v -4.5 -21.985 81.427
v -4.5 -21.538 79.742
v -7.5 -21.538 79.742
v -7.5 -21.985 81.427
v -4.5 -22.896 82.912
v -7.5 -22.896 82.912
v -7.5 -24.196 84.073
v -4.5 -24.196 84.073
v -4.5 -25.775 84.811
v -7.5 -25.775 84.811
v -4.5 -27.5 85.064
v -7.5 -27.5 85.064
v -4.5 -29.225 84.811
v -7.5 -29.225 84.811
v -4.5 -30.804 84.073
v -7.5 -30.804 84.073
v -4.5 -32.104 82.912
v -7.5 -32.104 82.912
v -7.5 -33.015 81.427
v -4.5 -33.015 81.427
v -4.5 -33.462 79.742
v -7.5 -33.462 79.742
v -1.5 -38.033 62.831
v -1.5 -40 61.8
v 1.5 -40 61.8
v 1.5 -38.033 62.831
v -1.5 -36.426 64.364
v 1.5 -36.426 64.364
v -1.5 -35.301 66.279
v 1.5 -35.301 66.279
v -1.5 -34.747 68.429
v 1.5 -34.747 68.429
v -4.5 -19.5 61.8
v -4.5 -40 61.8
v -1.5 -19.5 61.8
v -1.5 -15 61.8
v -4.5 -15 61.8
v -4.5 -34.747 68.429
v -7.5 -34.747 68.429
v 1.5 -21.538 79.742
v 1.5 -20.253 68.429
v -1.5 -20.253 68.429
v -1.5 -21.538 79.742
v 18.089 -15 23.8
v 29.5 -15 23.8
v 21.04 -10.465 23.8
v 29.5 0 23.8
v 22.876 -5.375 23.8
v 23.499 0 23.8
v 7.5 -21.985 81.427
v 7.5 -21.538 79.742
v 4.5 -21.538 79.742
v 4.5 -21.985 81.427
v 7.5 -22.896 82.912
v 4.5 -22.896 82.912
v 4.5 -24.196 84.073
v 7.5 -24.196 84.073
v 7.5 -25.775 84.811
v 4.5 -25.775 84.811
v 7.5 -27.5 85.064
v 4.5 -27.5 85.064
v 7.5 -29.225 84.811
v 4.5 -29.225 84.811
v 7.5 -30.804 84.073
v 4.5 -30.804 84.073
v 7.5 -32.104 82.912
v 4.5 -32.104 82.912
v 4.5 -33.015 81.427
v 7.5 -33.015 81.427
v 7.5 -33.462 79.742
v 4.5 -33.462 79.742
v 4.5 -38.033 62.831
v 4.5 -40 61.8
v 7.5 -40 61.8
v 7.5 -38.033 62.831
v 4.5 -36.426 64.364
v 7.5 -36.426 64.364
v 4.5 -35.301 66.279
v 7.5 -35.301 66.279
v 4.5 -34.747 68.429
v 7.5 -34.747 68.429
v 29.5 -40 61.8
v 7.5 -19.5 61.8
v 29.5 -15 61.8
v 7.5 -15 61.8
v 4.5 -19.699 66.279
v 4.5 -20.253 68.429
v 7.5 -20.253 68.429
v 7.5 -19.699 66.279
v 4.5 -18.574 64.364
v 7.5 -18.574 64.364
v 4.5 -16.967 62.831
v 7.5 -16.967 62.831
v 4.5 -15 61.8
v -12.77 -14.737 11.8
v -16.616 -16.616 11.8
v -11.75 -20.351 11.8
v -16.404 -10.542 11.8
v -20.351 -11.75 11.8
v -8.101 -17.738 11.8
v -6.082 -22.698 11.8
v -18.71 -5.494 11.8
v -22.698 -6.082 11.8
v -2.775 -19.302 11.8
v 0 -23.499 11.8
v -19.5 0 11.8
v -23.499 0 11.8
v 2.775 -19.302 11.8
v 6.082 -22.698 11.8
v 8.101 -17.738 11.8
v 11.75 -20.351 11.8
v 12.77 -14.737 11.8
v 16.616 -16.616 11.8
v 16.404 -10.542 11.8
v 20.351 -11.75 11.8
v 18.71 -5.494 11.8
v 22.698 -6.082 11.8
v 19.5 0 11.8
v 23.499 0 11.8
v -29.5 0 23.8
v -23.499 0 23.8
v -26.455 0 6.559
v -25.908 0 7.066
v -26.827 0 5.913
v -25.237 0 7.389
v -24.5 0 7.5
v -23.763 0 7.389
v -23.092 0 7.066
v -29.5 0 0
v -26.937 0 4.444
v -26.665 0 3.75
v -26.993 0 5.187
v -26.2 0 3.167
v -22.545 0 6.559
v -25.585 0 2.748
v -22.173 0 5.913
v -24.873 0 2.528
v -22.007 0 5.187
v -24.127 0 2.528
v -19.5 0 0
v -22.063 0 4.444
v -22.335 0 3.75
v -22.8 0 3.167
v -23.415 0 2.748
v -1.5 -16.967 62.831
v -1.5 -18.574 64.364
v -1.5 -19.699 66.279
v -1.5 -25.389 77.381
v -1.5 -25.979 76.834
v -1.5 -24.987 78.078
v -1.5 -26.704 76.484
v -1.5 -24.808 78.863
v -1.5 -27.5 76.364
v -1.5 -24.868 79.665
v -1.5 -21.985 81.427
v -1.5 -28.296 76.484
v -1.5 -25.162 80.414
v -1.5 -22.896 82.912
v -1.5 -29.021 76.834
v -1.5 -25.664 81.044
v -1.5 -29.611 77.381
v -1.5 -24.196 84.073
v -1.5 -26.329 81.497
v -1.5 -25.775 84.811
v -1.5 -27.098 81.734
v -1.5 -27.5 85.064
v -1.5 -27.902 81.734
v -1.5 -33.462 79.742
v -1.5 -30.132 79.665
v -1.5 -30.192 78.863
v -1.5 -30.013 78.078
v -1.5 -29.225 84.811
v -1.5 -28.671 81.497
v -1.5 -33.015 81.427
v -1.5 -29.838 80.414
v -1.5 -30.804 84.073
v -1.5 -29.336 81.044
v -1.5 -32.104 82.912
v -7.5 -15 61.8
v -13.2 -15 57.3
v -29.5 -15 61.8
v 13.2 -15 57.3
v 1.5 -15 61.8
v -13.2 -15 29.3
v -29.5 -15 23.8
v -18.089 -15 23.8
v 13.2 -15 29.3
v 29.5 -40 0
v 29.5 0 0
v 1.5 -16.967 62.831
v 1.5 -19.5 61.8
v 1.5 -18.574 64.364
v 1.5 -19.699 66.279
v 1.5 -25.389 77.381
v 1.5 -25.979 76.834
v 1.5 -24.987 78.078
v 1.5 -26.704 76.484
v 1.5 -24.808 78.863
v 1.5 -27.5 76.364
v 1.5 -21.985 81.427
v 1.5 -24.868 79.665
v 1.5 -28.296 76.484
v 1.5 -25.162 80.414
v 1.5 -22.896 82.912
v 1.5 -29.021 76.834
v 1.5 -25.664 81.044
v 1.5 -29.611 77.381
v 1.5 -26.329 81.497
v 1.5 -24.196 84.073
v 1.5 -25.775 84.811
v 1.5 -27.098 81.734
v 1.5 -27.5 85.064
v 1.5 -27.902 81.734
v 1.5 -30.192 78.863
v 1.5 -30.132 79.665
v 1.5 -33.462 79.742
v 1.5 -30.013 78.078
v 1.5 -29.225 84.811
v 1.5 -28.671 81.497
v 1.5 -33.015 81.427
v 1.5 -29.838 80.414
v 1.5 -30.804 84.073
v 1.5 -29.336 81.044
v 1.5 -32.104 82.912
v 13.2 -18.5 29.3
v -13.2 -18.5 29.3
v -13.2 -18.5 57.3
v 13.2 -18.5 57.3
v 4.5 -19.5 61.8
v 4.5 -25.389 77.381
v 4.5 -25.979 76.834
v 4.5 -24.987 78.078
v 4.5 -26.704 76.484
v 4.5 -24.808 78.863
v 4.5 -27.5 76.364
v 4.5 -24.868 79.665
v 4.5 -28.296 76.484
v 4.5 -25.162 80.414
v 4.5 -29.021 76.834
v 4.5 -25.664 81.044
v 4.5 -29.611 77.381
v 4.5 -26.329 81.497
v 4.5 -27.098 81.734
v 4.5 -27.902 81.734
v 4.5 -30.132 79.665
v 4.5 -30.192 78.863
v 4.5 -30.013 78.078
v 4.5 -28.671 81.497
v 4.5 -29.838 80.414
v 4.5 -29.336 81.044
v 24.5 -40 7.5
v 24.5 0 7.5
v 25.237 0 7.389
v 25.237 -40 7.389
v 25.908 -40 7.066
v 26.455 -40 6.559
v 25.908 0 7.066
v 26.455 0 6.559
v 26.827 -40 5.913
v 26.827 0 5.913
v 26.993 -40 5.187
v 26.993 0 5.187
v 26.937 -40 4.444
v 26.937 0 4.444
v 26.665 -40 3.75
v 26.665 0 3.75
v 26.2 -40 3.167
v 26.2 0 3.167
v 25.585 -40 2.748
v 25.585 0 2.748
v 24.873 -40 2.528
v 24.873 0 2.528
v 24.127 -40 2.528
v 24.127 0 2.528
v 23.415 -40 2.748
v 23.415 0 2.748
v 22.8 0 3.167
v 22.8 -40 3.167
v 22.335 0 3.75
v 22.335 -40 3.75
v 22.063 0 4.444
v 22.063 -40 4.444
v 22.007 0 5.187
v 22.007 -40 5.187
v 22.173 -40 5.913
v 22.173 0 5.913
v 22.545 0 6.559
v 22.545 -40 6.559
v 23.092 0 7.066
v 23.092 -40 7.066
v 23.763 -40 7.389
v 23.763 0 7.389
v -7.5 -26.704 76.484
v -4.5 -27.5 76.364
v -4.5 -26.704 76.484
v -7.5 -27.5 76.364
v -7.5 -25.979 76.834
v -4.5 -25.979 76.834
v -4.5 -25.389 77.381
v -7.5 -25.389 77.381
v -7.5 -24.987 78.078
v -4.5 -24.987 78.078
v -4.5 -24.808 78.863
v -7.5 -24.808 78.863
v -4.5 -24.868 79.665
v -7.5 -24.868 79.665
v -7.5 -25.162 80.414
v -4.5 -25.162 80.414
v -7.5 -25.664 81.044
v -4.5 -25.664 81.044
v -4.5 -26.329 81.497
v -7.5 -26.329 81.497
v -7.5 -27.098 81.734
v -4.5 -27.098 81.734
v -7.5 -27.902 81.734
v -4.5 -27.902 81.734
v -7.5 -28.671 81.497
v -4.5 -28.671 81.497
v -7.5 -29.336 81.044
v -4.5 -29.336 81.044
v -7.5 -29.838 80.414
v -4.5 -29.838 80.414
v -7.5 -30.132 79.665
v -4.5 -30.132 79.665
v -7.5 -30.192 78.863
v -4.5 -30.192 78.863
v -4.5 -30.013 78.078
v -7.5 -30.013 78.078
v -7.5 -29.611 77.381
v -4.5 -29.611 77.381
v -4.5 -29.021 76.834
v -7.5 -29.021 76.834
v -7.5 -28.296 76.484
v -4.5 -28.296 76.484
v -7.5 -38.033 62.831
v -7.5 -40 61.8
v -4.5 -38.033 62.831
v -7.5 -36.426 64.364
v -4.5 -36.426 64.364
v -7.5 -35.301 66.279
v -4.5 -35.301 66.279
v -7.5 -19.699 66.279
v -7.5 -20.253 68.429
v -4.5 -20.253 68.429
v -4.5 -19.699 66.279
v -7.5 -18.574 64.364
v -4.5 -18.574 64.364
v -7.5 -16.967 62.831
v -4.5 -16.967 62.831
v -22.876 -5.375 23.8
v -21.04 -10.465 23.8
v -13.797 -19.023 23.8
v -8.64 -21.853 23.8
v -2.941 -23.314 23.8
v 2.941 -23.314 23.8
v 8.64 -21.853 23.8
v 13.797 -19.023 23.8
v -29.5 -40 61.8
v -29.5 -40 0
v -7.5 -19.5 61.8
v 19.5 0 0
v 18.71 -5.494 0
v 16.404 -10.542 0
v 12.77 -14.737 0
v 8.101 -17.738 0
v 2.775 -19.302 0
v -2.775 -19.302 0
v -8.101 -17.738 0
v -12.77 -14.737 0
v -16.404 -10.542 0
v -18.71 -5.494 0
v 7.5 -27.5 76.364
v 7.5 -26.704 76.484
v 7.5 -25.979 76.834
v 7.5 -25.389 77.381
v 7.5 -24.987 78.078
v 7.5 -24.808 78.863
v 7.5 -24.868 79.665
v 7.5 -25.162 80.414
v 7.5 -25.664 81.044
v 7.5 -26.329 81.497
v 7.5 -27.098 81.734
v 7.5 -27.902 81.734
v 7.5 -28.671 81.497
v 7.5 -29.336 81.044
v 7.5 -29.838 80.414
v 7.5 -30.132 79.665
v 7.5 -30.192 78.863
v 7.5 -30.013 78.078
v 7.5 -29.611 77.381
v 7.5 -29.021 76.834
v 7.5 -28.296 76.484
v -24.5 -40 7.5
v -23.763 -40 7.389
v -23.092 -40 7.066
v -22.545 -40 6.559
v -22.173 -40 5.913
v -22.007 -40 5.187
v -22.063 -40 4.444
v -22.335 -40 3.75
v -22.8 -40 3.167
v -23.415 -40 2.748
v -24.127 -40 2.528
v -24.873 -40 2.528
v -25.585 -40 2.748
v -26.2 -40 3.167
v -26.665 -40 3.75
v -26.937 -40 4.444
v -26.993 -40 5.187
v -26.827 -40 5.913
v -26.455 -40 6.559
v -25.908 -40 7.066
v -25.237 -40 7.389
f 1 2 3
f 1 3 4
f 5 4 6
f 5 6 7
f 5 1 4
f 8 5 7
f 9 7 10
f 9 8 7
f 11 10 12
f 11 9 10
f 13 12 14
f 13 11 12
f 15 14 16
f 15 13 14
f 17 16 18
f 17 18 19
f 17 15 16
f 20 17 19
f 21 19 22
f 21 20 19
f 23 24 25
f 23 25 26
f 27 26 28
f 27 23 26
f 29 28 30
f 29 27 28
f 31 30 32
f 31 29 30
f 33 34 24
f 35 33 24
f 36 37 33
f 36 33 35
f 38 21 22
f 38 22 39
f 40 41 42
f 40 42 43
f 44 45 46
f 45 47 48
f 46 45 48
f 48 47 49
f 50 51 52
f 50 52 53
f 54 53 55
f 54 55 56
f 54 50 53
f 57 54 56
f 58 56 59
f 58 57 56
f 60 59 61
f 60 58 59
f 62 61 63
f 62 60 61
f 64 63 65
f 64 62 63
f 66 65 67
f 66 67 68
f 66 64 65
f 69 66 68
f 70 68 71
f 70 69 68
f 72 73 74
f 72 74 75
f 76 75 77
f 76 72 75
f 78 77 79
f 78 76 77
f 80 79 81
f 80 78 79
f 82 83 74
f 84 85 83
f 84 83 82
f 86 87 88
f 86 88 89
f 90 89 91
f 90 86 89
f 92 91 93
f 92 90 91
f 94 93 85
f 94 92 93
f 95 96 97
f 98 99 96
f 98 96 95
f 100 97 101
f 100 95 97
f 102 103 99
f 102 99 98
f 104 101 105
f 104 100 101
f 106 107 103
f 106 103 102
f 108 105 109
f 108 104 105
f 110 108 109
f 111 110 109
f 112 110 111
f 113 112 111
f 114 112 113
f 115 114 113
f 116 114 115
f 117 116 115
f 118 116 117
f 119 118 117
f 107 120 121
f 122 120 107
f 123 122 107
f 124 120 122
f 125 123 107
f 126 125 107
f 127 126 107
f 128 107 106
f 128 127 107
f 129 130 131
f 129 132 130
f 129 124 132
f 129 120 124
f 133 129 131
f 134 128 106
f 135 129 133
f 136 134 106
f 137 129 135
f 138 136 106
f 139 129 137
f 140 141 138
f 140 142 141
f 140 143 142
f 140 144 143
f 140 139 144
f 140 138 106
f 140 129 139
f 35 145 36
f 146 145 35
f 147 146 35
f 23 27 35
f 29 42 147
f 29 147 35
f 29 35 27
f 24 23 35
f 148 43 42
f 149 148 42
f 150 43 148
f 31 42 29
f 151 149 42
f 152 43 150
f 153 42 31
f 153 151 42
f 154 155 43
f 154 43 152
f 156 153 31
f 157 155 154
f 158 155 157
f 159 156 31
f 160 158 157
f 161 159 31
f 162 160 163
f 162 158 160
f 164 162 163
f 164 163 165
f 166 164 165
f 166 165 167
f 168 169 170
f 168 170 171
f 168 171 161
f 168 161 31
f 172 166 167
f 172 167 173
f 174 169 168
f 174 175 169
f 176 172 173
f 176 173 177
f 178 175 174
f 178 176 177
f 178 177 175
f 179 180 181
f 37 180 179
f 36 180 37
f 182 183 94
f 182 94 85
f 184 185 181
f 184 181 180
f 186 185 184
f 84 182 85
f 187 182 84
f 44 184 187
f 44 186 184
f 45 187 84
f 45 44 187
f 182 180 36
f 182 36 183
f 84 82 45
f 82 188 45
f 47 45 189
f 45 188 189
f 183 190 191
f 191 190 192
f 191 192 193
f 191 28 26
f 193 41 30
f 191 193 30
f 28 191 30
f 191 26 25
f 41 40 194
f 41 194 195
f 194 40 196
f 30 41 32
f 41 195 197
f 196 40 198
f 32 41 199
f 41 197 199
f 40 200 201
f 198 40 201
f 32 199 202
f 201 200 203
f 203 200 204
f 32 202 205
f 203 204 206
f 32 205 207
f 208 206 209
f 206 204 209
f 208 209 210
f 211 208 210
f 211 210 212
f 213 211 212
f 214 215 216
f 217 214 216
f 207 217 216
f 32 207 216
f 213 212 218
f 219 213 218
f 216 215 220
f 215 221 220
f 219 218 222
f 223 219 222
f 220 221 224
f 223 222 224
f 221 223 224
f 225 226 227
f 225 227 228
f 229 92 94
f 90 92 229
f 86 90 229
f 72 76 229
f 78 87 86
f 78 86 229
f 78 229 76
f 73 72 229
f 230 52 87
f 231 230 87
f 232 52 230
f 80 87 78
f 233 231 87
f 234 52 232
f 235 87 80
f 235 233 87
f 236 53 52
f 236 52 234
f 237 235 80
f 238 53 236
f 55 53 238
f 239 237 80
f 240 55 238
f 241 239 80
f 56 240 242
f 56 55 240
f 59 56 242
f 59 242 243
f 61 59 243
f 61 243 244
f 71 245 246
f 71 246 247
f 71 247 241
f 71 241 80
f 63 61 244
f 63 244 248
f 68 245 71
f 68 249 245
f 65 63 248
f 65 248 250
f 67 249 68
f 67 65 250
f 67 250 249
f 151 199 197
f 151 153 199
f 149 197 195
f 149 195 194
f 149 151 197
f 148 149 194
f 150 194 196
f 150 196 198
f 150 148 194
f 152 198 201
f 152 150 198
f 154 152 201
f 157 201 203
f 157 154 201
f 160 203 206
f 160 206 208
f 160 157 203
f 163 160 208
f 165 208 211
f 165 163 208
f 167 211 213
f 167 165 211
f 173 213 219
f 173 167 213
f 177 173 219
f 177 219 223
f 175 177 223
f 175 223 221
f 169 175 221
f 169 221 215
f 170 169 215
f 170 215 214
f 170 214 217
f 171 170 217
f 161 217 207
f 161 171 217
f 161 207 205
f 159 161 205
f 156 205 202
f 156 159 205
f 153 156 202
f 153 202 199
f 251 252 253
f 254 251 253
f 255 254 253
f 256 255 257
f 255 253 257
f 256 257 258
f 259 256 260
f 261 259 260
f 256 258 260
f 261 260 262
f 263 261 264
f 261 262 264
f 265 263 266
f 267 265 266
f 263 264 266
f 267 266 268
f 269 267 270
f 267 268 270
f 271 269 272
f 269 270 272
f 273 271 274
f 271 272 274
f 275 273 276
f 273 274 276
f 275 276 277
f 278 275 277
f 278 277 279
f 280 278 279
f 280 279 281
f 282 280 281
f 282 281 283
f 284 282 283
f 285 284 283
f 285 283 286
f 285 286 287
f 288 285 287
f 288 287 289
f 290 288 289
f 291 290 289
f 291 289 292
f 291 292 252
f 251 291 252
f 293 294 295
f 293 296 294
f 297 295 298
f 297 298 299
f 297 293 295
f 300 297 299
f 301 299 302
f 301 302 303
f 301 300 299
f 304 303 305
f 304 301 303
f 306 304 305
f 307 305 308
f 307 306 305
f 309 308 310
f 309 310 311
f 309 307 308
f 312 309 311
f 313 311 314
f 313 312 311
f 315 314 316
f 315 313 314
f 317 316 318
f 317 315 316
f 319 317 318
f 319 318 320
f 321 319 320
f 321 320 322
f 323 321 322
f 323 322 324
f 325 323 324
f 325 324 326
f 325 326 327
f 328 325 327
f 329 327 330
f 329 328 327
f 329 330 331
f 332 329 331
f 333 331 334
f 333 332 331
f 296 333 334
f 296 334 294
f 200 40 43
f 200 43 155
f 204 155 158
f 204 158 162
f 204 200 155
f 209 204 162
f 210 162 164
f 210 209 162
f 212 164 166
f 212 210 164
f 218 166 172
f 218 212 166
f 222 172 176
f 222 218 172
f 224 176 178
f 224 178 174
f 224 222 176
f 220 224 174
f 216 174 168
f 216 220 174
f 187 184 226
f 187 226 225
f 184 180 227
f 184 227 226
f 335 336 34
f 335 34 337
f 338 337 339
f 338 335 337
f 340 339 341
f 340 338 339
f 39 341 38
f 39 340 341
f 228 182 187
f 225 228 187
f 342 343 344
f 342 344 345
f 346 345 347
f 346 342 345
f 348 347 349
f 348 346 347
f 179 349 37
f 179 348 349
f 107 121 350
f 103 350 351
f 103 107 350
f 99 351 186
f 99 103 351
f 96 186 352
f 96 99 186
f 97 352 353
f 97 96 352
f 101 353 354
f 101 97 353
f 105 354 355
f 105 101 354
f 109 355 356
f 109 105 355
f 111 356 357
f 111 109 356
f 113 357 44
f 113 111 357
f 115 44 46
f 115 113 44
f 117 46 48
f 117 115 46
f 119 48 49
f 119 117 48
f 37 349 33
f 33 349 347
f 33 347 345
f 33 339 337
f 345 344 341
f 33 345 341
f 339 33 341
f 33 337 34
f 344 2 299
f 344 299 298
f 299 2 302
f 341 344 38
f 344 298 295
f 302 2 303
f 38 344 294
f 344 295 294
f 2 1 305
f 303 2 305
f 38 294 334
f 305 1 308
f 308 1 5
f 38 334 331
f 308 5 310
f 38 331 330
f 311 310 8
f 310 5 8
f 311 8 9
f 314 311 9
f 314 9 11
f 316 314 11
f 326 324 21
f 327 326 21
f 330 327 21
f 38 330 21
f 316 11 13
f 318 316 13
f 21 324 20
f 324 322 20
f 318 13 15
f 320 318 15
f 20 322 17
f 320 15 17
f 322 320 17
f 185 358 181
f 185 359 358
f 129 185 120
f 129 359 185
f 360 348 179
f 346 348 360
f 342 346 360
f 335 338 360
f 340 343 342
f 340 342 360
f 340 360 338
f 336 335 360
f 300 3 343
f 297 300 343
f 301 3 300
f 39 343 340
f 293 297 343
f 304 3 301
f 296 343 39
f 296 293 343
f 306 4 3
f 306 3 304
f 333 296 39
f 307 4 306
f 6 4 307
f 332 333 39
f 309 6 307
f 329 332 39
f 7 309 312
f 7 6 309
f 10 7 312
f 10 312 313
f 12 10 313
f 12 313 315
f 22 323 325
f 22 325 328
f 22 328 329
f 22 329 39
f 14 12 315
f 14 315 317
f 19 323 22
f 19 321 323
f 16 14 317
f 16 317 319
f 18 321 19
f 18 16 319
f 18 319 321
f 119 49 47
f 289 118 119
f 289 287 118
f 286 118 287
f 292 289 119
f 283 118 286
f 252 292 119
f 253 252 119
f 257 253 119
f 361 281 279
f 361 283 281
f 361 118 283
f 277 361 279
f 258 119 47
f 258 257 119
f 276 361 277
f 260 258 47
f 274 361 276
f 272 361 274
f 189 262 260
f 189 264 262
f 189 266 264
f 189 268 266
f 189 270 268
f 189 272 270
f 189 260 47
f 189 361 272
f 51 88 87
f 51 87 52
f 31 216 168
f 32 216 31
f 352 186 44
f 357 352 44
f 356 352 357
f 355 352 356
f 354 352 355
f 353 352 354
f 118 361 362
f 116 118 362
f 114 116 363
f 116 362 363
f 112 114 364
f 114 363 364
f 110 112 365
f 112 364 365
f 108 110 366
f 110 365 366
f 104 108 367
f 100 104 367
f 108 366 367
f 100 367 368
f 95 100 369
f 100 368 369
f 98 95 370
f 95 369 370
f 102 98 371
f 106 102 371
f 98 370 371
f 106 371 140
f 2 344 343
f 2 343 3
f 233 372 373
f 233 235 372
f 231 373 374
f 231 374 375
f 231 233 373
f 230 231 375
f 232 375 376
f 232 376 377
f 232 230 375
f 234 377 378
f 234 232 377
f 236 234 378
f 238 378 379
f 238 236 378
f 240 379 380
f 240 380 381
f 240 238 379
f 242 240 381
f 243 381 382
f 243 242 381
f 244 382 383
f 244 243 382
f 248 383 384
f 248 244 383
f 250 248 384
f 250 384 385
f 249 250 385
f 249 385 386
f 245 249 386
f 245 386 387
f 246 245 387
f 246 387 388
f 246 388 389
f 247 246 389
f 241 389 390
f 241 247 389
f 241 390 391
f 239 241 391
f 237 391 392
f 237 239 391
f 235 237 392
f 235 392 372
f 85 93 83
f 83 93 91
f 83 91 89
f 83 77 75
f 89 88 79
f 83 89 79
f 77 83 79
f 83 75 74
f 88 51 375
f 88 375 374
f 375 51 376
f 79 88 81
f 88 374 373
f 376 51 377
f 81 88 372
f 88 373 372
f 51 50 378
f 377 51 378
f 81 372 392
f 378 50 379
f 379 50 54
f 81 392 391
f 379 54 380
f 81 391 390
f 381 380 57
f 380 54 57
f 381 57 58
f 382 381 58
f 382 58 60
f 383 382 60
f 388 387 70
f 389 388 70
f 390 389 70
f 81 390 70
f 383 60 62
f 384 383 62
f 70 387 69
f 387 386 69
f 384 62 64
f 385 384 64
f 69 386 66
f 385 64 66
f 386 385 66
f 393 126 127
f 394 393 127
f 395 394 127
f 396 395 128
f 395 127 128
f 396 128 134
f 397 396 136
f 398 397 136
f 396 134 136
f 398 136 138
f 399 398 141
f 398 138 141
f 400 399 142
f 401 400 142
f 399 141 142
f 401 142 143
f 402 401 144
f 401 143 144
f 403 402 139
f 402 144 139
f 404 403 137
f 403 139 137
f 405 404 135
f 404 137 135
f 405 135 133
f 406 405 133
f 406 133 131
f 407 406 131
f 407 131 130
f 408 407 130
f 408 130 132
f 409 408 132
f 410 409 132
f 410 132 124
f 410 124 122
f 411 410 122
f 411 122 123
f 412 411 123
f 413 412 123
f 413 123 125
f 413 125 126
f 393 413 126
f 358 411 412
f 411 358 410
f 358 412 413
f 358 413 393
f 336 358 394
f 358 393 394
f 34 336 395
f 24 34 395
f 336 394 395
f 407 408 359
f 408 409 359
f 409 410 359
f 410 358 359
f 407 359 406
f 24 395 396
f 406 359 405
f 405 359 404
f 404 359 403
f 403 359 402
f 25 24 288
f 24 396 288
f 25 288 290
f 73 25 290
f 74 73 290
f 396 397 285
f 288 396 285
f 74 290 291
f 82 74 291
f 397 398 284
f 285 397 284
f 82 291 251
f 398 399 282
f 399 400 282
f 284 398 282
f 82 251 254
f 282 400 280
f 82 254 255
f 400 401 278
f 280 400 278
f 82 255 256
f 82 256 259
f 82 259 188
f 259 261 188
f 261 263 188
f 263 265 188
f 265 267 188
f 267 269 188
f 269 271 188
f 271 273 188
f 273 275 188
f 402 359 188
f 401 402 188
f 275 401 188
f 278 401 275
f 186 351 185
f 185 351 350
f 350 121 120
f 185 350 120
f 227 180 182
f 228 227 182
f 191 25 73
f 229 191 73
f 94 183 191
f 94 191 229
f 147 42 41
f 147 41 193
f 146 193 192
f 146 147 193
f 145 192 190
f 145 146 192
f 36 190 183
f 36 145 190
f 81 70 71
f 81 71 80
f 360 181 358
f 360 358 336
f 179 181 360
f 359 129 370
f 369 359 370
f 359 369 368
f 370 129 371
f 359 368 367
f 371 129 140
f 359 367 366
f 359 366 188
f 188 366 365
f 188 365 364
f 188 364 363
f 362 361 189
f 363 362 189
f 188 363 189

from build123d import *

# Parameters (mm, degrees)
BOSS_EXTRUDE1_DEPTH = 11.8
BOSS_EXTRUDE2_DEPTH = 12
SKETCH3_W           = 59
SKETCH3_H           = 25
BOSS_EXTRUDE3_DEPTH = 38
SKETCH4_W           = 26.4
SKETCH4_H           = 28
CUT_EXTRUDE1_DEPTH  = 3.5
SKETCH5_R           = 2.5
CUT_EXTRUDE2_DEPTH  = 80.30630492
SKETCH6_R           = 2.7
BOSS_EXTRUDE4_DEPTH = 1.5
LPATTERN1_COUNT     = 2
LPATTERN1_PITCH     = 6
LPATTERN1_COL_COUNT = 2
LPATTERN1_COL_PITCH = 6
FILLET1_R           = 8


with BuildPart() as part:
    # Sketch1 → Boss-Extrude1 (new body)
    with BuildSketch(Plane.XY):
        with BuildLine():
            Line((-19.5, 0), (-29.5, 0))
            Line((-29.5, 0), (-29.5, -40))
            Line((-29.5, -40), (29.5, -40))
            Line((29.5, -40), (29.5, 0))
            Line((29.5, 0), (19.5, 0))
            ThreePointArc((19.5, 0), (0, -19.5), (-19.5, 0))
        make_face()
    extrude(amount=BOSS_EXTRUDE1_DEPTH)

    # Sketch2 → Boss-Extrude2 (add)
    with BuildSketch(Plane.XY.offset(11.8)):
        with BuildLine():
            Line((23.499107394, 0), (29.5, 0))
            Line((29.5, 0), (29.5, -40))
            Line((29.5, -40), (-29.5, -40))
            Line((-29.5, -40), (-29.5, 0))
            Line((-29.5, 0), (-23.499107394, 0))
            ThreePointArc((-23.499107394, 0), (0, -23.499107394), (23.499107394, 0))
        make_face()
    extrude(amount=BOSS_EXTRUDE2_DEPTH)

    # Sketch3 → Boss-Extrude3 (add)
    with BuildSketch(Plane.XY.offset(23.8)):
        with Locations((0, -27.5)):
            Rectangle(SKETCH3_W, SKETCH3_H)
    extrude(amount=BOSS_EXTRUDE3_DEPTH)

    # Sketch4 → Cut-Extrude1 (cut)
    with BuildSketch(Plane(origin=(0, -15, 0), x_dir=(1, 0, 0), z_dir=(0, 1, 0))):
        with Locations((0, -43.3)):
            Rectangle(SKETCH4_W, SKETCH4_H)
    extrude(amount=-CUT_EXTRUDE1_DEPTH, mode=Mode.SUBTRACT)

    # Sketch5 → Cut-Extrude2 (cut, through all)
    with BuildSketch(Plane(origin=(0, 0, 0), x_dir=(1, 0, 0), z_dir=(0, 1, 0))):
        with Locations(Location((-24.5, -5, 0), (0, 0, 270))):
            Circle(SKETCH5_R)
        with Locations(Location((24.5, -5, 0), (0, 0, 270))):
            Circle(SKETCH5_R)
    extrude(amount=-CUT_EXTRUDE2_DEPTH, mode=Mode.SUBTRACT)

    # Sketch6 → Boss-Extrude4 (add, symmetric)
    with BuildSketch(Plane(origin=(0, 0, 0), x_dir=(0, 0, -1), z_dir=(1, 0, 0))):
        with BuildLine():
            Line((-61.8, -19.5), (-79.74176436, -21.538350337))
            ThreePointArc((-79.74176436, -21.538350337), (-85.064465832, -27.5), (-79.74176436, -33.461649663))
            Line((-79.74176436, -33.461649663), (-61.8, -35.5))
            Line((-61.8, -35.5), (-61.8, -19.5))
        make_face()
        with Locations((-79.064465832, -27.5)):
            Circle(SKETCH6_R, mode=Mode.SUBTRACT)
    boss_extrude4 = extrude(amount=BOSS_EXTRUDE4_DEPTH, both=True)

    # LPattern1: Boss-Extrude4 ×2
    with Locations(*[(-i * LPATTERN1_PITCH, 0, 0) for i in range(1, LPATTERN1_COUNT)]):
        add(boss_extrude4)

    # LPattern1 col: Boss-Extrude4 ×2
    with Locations(*[(i * LPATTERN1_COL_PITCH, 0, 0) for i in range(1, LPATTERN1_COL_COUNT)]):
        add(boss_extrude4)

    # Fillet1
    # the kernel refuses this fillet: 8 mm, written as the material it adds along each edge
    with BuildSketch(Plane(origin=(-7.5, -35.5, 61.8), x_dir=(0, -1, 0), z_dir=(1, 0, 0)), Plane(origin=(-1.5, -35.5, 61.8), x_dir=(0, -1, 0), z_dir=(1, 0, 0)), Plane(origin=(4.5, -35.5, 61.8), x_dir=(0, -1, 0), z_dir=(1, 0, 0))) as fillet1_piece_1:
        with BuildLine():
            CenterArc((7.195743205, -7.532129086), FILLET1_R, 109.69224948, 63.826210699)
            Line((-0.753123012, -6.629064382), (-0.912100336, -6.611003087))
            Line((-0.912100336, -6.611003087), (-0.158977324, 0.018061294))
            Line((-0.158977324, 0.018061294), (0, 0.16))
            ThreePointArc((0, 0.16), (2.25, 0.16), (4.446085136, 0.150642582))
            Line((4.446085136, 0.150642582), (4.5, 0))
        make_face()
    extrude(amount=3)
    with BuildSketch(Plane(origin=(-7.5, -35.5, 61.8), x_dir=(0, -1, 0), z_dir=(1, 0, 0))) as fillet1_piece_2_section:
        with BuildLine():
            CenterArc((7.195743205, -7.532129086), FILLET1_R, 109.69224948, 63.826210699)
            Line((-0.753123012, -6.629064382), (-0.912100336, -6.611003087))
            Line((-0.912100336, -6.611003087), (-0.158977324, 0.018061294))
            Line((-0.158977324, 0.018061294), (0, 0.16))
            ThreePointArc((0, 0.16), (2.25, 0.16), (4.446085136, 0.150642582))
            Line((4.446085136, 0.150642582), (4.5, 0))
        make_face()
    fillet1_piece_2 = extrude(amount=19.679270227, mode=Mode.PRIVATE)
    fillet1_piece_2 = split(fillet1_piece_2, bisect_by=Plane(origin=(-1.5, -36.458947271, 63.391764359), z_dir=(1, 0, 0)), keep=Keep.TOP, mode=Mode.PRIVATE)
    fillet1_piece_2 = split(fillet1_piece_2, bisect_by=Plane(origin=(1.5, -36.458947271, 63.391764359), z_dir=(-1, 0, 0)), keep=Keep.TOP, mode=Mode.PRIVATE)
    add(fillet1_piece_2)
    with BuildSketch(Plane(origin=(-7.5, -35.5, 61.8), x_dir=(0, -1, 0), z_dir=(1, 0, 0))) as fillet1_piece_3_section:
        with BuildLine():
            CenterArc((7.195743205, -7.532129086), FILLET1_R, 109.69224948, 63.826210699)
            Line((-0.753123012, -6.629064382), (-0.912100336, -6.611003087))
            Line((-0.912100336, -6.611003087), (-0.158977324, 0.018061294))
            Line((-0.158977324, 0.018061294), (0, 0.16))
            ThreePointArc((0, 0.16), (2.25, 0.16), (4.446085136, 0.150642582))
            Line((4.446085136, 0.150642582), (4.5, 0))
        make_face()
    fillet1_piece_3 = extrude(amount=19.679270227, mode=Mode.PRIVATE)
    fillet1_piece_3 = split(fillet1_piece_3, bisect_by=Plane(origin=(4.5, -36.458947271, 63.391764359), z_dir=(1, 0, 0)), keep=Keep.TOP, mode=Mode.PRIVATE)
    fillet1_piece_3 = split(fillet1_piece_3, bisect_by=Plane(origin=(7.5, -36.458947271, 63.391764359), z_dir=(-1, 0, 0)), keep=Keep.TOP, mode=Mode.PRIVATE)
    add(fillet1_piece_3)
    with BuildSketch(Plane(origin=(-7.5, -19.5, 61.8), x_dir=(0, 1, 0), z_dir=(1, 0, 0)), Plane(origin=(-1.5, -19.5, 61.8), x_dir=(0, 1, 0), z_dir=(1, 0, 0)), Plane(origin=(4.5, -19.5, 61.8), x_dir=(0, 1, 0), z_dir=(1, 0, 0))) as fillet1_piece_4:
        with BuildLine():
            CenterArc((7.195743205, 7.532129086), FILLET1_R, 186.481539821, 63.826210699)
            Line((-0.753123012, 6.629064382), (-0.912100336, 6.611003087))
            Line((-0.912100336, 6.611003087), (-0.158977324, -0.018061294))
            Line((-0.158977324, -0.018061294), (0, -0.16))
            ThreePointArc((0, -0.16), (2.25, -0.16), (4.446085136, -0.150642582))
            Line((4.446085136, -0.150642582), (4.5, 0))
        make_face()
    extrude(amount=3)
    with BuildSketch(Plane(origin=(-7.5, -19.5, 61.8), x_dir=(0, 1, 0), z_dir=(1, 0, 0))) as fillet1_piece_5_section:
        with BuildLine():
            CenterArc((7.195743205, 7.532129086), FILLET1_R, 186.481539821, 63.826210699)
            Line((-0.753123012, 6.629064382), (-0.912100336, 6.611003087))
            Line((-0.912100336, 6.611003087), (-0.158977324, -0.018061294))
            Line((-0.158977324, -0.018061294), (0, -0.16))
            ThreePointArc((0, -0.16), (2.25, -0.16), (4.446085136, -0.150642582))
            Line((4.446085136, -0.150642582), (4.5, 0))
        make_face()
    fillet1_piece_5 = extrude(amount=19.679270227, mode=Mode.PRIVATE)
    fillet1_piece_5 = split(fillet1_piece_5, bisect_by=Plane(origin=(-1.5, -18.541052729, 63.391764359), z_dir=(1, 0, 0)), keep=Keep.TOP, mode=Mode.PRIVATE)
    fillet1_piece_5 = split(fillet1_piece_5, bisect_by=Plane(origin=(1.5, -18.541052729, 63.391764359), z_dir=(-1, 0, 0)), keep=Keep.TOP, mode=Mode.PRIVATE)
    add(fillet1_piece_5)
    with BuildSketch(Plane(origin=(-7.5, -19.5, 61.8), x_dir=(0, 1, 0), z_dir=(1, 0, 0))) as fillet1_piece_6_section:
        with BuildLine():
            CenterArc((7.195743205, 7.532129086), FILLET1_R, 186.481539821, 63.826210699)
            Line((-0.753123012, 6.629064382), (-0.912100336, 6.611003087))
            Line((-0.912100336, 6.611003087), (-0.158977324, -0.018061294))
            Line((-0.158977324, -0.018061294), (0, -0.16))
            ThreePointArc((0, -0.16), (2.25, -0.16), (4.446085136, -0.150642582))
            Line((4.446085136, -0.150642582), (4.5, 0))
        make_face()
    fillet1_piece_6 = extrude(amount=19.679270227, mode=Mode.PRIVATE)
    fillet1_piece_6 = split(fillet1_piece_6, bisect_by=Plane(origin=(7.5, -18.541052729, 63.391764359), z_dir=(-1, 0, 0)), keep=Keep.TOP, mode=Mode.PRIVATE)
    fillet1_piece_6 = split(fillet1_piece_6, bisect_by=Plane(origin=(4.5, -18.541052729, 63.391764359), z_dir=(1, 0, 0)), keep=Keep.TOP, mode=Mode.PRIVATE)
    add(fillet1_piece_6)
    with BuildSketch(Plane(origin=(-18.179270227, -35.5, 61.8), x_dir=(0, -1, 0), z_dir=(1, 0, 0))) as fillet1_piece_7_section:
        with BuildLine():
            CenterArc((7.195743205, -7.532129086), FILLET1_R, 109.69224948, 63.826210699)
            Line((-0.753123012, -6.629064382), (-0.912100336, -6.611003087))
            Line((-0.912100336, -6.611003087), (-0.158977324, 0.018061294))
            Line((-0.158977324, 0.018061294), (0, 0.16))
            ThreePointArc((0, 0.16), (2.25, 0.16), (4.446085136, 0.150642582))
            Line((4.446085136, 0.150642582), (4.5, 0))
        make_face()
    fillet1_piece_7 = extrude(amount=19.679270227, mode=Mode.PRIVATE)
    fillet1_piece_7 = split(fillet1_piece_7, bisect_by=Plane(origin=(-7.5, -36.458947271, 63.391764359), z_dir=(1, 0, 0)), keep=Keep.TOP, mode=Mode.PRIVATE)
    fillet1_piece_7 = split(fillet1_piece_7, bisect_by=Plane(origin=(-4.5, -36.458947271, 63.391764359), z_dir=(-1, 0, 0)), keep=Keep.TOP, mode=Mode.PRIVATE)
    add(fillet1_piece_7)
    with BuildSketch(Plane(origin=(-1.5, -35.5, 61.8), x_dir=(0, -1, 0), z_dir=(1, 0, 0))) as fillet1_piece_8_section:
        with BuildLine():
            CenterArc((7.195743205, -7.532129086), FILLET1_R, 109.69224948, 63.826210699)
            Line((-0.753123012, -6.629064382), (-0.912100336, -6.611003087))
            Line((-0.912100336, -6.611003087), (-0.158977324, 0.018061294))
            Line((-0.158977324, 0.018061294), (0, 0.16))
            ThreePointArc((0, 0.16), (2.25, 0.16), (4.446085136, 0.150642582))
            Line((4.446085136, 0.150642582), (4.5, 0))
        make_face()
    fillet1_piece_8 = extrude(amount=19.679270227, mode=Mode.PRIVATE)
    fillet1_piece_8 = split(fillet1_piece_8, bisect_by=Plane(origin=(4.5, -36.458947271, 63.391764359), z_dir=(1, 0, 0)), keep=Keep.TOP, mode=Mode.PRIVATE)
    fillet1_piece_8 = split(fillet1_piece_8, bisect_by=Plane(origin=(7.5, -36.458947271, 63.391764359), z_dir=(-1, 0, 0)), keep=Keep.TOP, mode=Mode.PRIVATE)
    add(fillet1_piece_8)
    with BuildSketch(Plane(origin=(-18.179270227, -19.5, 61.8), x_dir=(0, 1, 0), z_dir=(1, 0, 0))) as fillet1_piece_9_section:
        with BuildLine():
            CenterArc((7.195743205, 7.532129086), FILLET1_R, 186.481539821, 63.826210699)
            Line((-0.753123012, 6.629064382), (-0.912100336, 6.611003087))
            Line((-0.912100336, 6.611003087), (-0.158977324, -0.018061294))
            Line((-0.158977324, -0.018061294), (0, -0.16))
            ThreePointArc((0, -0.16), (2.25, -0.16), (4.446085136, -0.150642582))
            Line((4.446085136, -0.150642582), (4.5, 0))
        make_face()
    fillet1_piece_9 = extrude(amount=19.679270227, mode=Mode.PRIVATE)
    fillet1_piece_9 = split(fillet1_piece_9, bisect_by=Plane(origin=(-7.5, -18.541052729, 63.391764359), z_dir=(1, 0, 0)), keep=Keep.TOP, mode=Mode.PRIVATE)
    fillet1_piece_9 = split(fillet1_piece_9, bisect_by=Plane(origin=(-4.5, -18.541052729, 63.391764359), z_dir=(-1, 0, 0)), keep=Keep.TOP, mode=Mode.PRIVATE)
    add(fillet1_piece_9)
    with BuildSketch(Plane(origin=(-1.5, -19.5, 61.8), x_dir=(0, 1, 0), z_dir=(1, 0, 0))) as fillet1_piece_10_section:
        with BuildLine():
            CenterArc((7.195743205, 7.532129086), FILLET1_R, 186.481539821, 63.826210699)
            Line((-0.753123012, 6.629064382), (-0.912100336, 6.611003087))
            Line((-0.912100336, 6.611003087), (-0.158977324, -0.018061294))
            Line((-0.158977324, -0.018061294), (0, -0.16))
            ThreePointArc((0, -0.16), (2.25, -0.16), (4.446085136, -0.150642582))
            Line((4.446085136, -0.150642582), (4.5, 0))
        make_face()
    fillet1_piece_10 = extrude(amount=19.679270227, mode=Mode.PRIVATE)
    fillet1_piece_10 = split(fillet1_piece_10, bisect_by=Plane(origin=(7.5, -18.541052729, 63.391764359), z_dir=(-1, 0, 0)), keep=Keep.TOP, mode=Mode.PRIVATE)
    fillet1_piece_10 = split(fillet1_piece_10, bisect_by=Plane(origin=(4.5, -18.541052729, 63.391764359), z_dir=(1, 0, 0)), keep=Keep.TOP, mode=Mode.PRIVATE)
    add(fillet1_piece_10)
    with BuildSketch(Plane(origin=(-12.179270227, -35.5, 61.8), x_dir=(0, -1, 0), z_dir=(1, 0, 0))) as fillet1_piece_11_section:
        with BuildLine():
            CenterArc((7.195743205, -7.532129086), FILLET1_R, 109.69224948, 63.826210699)
            Line((-0.753123012, -6.629064382), (-0.912100336, -6.611003087))
            Line((-0.912100336, -6.611003087), (-0.158977324, 0.018061294))
            Line((-0.158977324, 0.018061294), (0, 0.16))
            ThreePointArc((0, 0.16), (2.25, 0.16), (4.446085136, 0.150642582))
            Line((4.446085136, 0.150642582), (4.5, 0))
        make_face()
    fillet1_piece_11 = extrude(amount=19.679270227, mode=Mode.PRIVATE)
    fillet1_piece_11 = split(fillet1_piece_11, bisect_by=Plane(origin=(-7.5, -36.458947271, 63.391764359), z_dir=(1, 0, 0)), keep=Keep.TOP, mode=Mode.PRIVATE)
    fillet1_piece_11 = split(fillet1_piece_11, bisect_by=Plane(origin=(-4.5, -36.458947271, 63.391764359), z_dir=(-1, 0, 0)), keep=Keep.TOP, mode=Mode.PRIVATE)
    add(fillet1_piece_11)
    with BuildSketch(Plane(origin=(-12.179270227, -35.5, 61.8), x_dir=(0, -1, 0), z_dir=(1, 0, 0))) as fillet1_piece_12_section:
        with BuildLine():
            CenterArc((7.195743205, -7.532129086), FILLET1_R, 109.69224948, 63.826210699)
            Line((-0.753123012, -6.629064382), (-0.912100336, -6.611003087))
            Line((-0.912100336, -6.611003087), (-0.158977324, 0.018061294))
            Line((-0.158977324, 0.018061294), (0, 0.16))
            ThreePointArc((0, 0.16), (2.25, 0.16), (4.446085136, 0.150642582))
            Line((4.446085136, 0.150642582), (4.5, 0))
        make_face()
    fillet1_piece_12 = extrude(amount=19.679270227, mode=Mode.PRIVATE)
    fillet1_piece_12 = split(fillet1_piece_12, bisect_by=Plane(origin=(-1.5, -36.458947271, 63.391764359), z_dir=(1, 0, 0)), keep=Keep.TOP, mode=Mode.PRIVATE)
    fillet1_piece_12 = split(fillet1_piece_12, bisect_by=Plane(origin=(1.5, -36.458947271, 63.391764359), z_dir=(-1, 0, 0)), keep=Keep.TOP, mode=Mode.PRIVATE)
    add(fillet1_piece_12)
    with BuildSketch(Plane(origin=(-12.179270227, -19.5, 61.8), x_dir=(0, 1, 0), z_dir=(1, 0, 0))) as fillet1_piece_13_section:
        with BuildLine():
            CenterArc((7.195743205, 7.532129086), FILLET1_R, 186.481539821, 63.826210699)
            Line((-0.753123012, 6.629064382), (-0.912100336, 6.611003087))
            Line((-0.912100336, 6.611003087), (-0.158977324, -0.018061294))
            Line((-0.158977324, -0.018061294), (0, -0.16))
            ThreePointArc((0, -0.16), (2.25, -0.16), (4.446085136, -0.150642582))
            Line((4.446085136, -0.150642582), (4.5, 0))
        make_face()
    fillet1_piece_13 = extrude(amount=19.679270227, mode=Mode.PRIVATE)
    fillet1_piece_13 = split(fillet1_piece_13, bisect_by=Plane(origin=(-7.5, -18.541052729, 63.391764359), z_dir=(1, 0, 0)), keep=Keep.TOP, mode=Mode.PRIVATE)
    fillet1_piece_13 = split(fillet1_piece_13, bisect_by=Plane(origin=(-4.5, -18.541052729, 63.391764359), z_dir=(-1, 0, 0)), keep=Keep.TOP, mode=Mode.PRIVATE)
    add(fillet1_piece_13)
    with BuildSketch(Plane(origin=(-12.179270227, -19.5, 61.8), x_dir=(0, 1, 0), z_dir=(1, 0, 0))) as fillet1_piece_14_section:
        with BuildLine():
            CenterArc((7.195743205, 7.532129086), FILLET1_R, 186.481539821, 63.826210699)
            Line((-0.753123012, 6.629064382), (-0.912100336, 6.611003087))
            Line((-0.912100336, 6.611003087), (-0.158977324, -0.018061294))
            Line((-0.158977324, -0.018061294), (0, -0.16))
            ThreePointArc((0, -0.16), (2.25, -0.16), (4.446085136, -0.150642582))
            Line((4.446085136, -0.150642582), (4.5, 0))
        make_face()
    fillet1_piece_14 = extrude(amount=19.679270227, mode=Mode.PRIVATE)
    fillet1_piece_14 = split(fillet1_piece_14, bisect_by=Plane(origin=(-1.5, -18.541052729, 63.391764359), z_dir=(1, 0, 0)), keep=Keep.TOP, mode=Mode.PRIVATE)
    fillet1_piece_14 = split(fillet1_piece_14, bisect_by=Plane(origin=(1.5, -18.541052729, 63.391764359), z_dir=(-1, 0, 0)), keep=Keep.TOP, mode=Mode.PRIVATE)
    add(fillet1_piece_14)


solid = part.part
